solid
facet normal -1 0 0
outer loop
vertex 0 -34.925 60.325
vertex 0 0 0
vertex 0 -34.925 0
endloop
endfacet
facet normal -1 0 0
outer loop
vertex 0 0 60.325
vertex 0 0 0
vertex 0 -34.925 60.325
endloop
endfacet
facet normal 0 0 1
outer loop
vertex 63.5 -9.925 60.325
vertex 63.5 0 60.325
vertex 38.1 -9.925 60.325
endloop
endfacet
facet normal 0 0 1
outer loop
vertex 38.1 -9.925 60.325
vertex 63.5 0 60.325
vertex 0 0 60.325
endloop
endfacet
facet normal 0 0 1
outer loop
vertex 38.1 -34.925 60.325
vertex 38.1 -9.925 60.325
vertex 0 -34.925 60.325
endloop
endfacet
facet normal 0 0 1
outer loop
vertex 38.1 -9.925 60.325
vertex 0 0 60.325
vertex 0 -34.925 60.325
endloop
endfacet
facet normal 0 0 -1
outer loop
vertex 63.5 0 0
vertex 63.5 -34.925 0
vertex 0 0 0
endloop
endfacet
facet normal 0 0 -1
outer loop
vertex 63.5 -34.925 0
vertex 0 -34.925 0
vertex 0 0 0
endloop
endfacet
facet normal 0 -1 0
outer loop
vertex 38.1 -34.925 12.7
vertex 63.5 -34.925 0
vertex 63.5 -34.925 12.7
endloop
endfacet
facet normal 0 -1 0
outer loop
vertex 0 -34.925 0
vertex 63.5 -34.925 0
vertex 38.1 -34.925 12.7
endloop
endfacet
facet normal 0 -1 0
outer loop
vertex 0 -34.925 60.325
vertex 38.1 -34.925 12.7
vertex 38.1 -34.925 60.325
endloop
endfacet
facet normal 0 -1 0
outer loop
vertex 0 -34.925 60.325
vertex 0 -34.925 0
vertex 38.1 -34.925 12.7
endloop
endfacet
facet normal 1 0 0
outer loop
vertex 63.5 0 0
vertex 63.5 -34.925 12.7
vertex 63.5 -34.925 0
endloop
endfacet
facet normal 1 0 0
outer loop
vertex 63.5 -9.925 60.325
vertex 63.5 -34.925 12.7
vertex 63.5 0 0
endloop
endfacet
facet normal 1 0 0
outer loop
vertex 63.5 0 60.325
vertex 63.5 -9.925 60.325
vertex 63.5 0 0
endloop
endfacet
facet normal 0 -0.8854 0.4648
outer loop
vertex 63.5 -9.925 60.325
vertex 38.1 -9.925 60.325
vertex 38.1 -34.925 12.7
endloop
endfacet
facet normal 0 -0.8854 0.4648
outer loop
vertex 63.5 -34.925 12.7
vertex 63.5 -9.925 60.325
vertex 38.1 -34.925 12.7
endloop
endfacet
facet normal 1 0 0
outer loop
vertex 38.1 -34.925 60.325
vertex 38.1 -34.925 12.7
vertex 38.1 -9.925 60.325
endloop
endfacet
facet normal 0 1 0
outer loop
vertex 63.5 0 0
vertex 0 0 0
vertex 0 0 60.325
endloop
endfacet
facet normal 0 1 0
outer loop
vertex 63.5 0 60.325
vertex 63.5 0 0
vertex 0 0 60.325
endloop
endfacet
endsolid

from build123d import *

# Parameters (mm, degrees)
F0_W     = 38.1
F0_H     = 60.325
F1_DEPTH = 34.925
F3_DEPTH = 25.4
F5_DEPTH = 25.4
F6_W     = 25.0000946254
F6_H     = 12.7
F7_DEPTH = 25.4


with BuildPart() as f1:
    # F0 (on Front) → F1 (new body)
    with BuildSketch(Plane.XZ):
        with Locations((19.05, 30.1625)):
            Rectangle(F0_W, F0_H)
    extrude(amount=F1_DEPTH)

    # F2 (on face) → F3 (join)
    with BuildSketch(Plane.YZ.offset(38.1)):
        Polygon((-9.9249053746, 60.325), (-34.925, 12.7), (-9.9249053746, 12.7), align=None)
    extrude(amount=F3_DEPTH)

    # F4 (on face) → F5 (join)
    with BuildSketch(Plane.YZ.offset(38.1)):
        Polygon((0, 60.325), (-9.9249053746, 60.325), (-9.9249053746, 12.7), (-9.9249053746, 0), (0, 0), align=None)
    extrude(amount=F5_DEPTH)

    # F6 (on face) → F7 (join)
    with BuildSketch(Plane.YZ.offset(38.1)):
        with Locations((-22.4249526873, 6.35)):
            Rectangle(F6_W, F6_H)
    extrude(amount=F7_DEPTH)


solid = f1.part
